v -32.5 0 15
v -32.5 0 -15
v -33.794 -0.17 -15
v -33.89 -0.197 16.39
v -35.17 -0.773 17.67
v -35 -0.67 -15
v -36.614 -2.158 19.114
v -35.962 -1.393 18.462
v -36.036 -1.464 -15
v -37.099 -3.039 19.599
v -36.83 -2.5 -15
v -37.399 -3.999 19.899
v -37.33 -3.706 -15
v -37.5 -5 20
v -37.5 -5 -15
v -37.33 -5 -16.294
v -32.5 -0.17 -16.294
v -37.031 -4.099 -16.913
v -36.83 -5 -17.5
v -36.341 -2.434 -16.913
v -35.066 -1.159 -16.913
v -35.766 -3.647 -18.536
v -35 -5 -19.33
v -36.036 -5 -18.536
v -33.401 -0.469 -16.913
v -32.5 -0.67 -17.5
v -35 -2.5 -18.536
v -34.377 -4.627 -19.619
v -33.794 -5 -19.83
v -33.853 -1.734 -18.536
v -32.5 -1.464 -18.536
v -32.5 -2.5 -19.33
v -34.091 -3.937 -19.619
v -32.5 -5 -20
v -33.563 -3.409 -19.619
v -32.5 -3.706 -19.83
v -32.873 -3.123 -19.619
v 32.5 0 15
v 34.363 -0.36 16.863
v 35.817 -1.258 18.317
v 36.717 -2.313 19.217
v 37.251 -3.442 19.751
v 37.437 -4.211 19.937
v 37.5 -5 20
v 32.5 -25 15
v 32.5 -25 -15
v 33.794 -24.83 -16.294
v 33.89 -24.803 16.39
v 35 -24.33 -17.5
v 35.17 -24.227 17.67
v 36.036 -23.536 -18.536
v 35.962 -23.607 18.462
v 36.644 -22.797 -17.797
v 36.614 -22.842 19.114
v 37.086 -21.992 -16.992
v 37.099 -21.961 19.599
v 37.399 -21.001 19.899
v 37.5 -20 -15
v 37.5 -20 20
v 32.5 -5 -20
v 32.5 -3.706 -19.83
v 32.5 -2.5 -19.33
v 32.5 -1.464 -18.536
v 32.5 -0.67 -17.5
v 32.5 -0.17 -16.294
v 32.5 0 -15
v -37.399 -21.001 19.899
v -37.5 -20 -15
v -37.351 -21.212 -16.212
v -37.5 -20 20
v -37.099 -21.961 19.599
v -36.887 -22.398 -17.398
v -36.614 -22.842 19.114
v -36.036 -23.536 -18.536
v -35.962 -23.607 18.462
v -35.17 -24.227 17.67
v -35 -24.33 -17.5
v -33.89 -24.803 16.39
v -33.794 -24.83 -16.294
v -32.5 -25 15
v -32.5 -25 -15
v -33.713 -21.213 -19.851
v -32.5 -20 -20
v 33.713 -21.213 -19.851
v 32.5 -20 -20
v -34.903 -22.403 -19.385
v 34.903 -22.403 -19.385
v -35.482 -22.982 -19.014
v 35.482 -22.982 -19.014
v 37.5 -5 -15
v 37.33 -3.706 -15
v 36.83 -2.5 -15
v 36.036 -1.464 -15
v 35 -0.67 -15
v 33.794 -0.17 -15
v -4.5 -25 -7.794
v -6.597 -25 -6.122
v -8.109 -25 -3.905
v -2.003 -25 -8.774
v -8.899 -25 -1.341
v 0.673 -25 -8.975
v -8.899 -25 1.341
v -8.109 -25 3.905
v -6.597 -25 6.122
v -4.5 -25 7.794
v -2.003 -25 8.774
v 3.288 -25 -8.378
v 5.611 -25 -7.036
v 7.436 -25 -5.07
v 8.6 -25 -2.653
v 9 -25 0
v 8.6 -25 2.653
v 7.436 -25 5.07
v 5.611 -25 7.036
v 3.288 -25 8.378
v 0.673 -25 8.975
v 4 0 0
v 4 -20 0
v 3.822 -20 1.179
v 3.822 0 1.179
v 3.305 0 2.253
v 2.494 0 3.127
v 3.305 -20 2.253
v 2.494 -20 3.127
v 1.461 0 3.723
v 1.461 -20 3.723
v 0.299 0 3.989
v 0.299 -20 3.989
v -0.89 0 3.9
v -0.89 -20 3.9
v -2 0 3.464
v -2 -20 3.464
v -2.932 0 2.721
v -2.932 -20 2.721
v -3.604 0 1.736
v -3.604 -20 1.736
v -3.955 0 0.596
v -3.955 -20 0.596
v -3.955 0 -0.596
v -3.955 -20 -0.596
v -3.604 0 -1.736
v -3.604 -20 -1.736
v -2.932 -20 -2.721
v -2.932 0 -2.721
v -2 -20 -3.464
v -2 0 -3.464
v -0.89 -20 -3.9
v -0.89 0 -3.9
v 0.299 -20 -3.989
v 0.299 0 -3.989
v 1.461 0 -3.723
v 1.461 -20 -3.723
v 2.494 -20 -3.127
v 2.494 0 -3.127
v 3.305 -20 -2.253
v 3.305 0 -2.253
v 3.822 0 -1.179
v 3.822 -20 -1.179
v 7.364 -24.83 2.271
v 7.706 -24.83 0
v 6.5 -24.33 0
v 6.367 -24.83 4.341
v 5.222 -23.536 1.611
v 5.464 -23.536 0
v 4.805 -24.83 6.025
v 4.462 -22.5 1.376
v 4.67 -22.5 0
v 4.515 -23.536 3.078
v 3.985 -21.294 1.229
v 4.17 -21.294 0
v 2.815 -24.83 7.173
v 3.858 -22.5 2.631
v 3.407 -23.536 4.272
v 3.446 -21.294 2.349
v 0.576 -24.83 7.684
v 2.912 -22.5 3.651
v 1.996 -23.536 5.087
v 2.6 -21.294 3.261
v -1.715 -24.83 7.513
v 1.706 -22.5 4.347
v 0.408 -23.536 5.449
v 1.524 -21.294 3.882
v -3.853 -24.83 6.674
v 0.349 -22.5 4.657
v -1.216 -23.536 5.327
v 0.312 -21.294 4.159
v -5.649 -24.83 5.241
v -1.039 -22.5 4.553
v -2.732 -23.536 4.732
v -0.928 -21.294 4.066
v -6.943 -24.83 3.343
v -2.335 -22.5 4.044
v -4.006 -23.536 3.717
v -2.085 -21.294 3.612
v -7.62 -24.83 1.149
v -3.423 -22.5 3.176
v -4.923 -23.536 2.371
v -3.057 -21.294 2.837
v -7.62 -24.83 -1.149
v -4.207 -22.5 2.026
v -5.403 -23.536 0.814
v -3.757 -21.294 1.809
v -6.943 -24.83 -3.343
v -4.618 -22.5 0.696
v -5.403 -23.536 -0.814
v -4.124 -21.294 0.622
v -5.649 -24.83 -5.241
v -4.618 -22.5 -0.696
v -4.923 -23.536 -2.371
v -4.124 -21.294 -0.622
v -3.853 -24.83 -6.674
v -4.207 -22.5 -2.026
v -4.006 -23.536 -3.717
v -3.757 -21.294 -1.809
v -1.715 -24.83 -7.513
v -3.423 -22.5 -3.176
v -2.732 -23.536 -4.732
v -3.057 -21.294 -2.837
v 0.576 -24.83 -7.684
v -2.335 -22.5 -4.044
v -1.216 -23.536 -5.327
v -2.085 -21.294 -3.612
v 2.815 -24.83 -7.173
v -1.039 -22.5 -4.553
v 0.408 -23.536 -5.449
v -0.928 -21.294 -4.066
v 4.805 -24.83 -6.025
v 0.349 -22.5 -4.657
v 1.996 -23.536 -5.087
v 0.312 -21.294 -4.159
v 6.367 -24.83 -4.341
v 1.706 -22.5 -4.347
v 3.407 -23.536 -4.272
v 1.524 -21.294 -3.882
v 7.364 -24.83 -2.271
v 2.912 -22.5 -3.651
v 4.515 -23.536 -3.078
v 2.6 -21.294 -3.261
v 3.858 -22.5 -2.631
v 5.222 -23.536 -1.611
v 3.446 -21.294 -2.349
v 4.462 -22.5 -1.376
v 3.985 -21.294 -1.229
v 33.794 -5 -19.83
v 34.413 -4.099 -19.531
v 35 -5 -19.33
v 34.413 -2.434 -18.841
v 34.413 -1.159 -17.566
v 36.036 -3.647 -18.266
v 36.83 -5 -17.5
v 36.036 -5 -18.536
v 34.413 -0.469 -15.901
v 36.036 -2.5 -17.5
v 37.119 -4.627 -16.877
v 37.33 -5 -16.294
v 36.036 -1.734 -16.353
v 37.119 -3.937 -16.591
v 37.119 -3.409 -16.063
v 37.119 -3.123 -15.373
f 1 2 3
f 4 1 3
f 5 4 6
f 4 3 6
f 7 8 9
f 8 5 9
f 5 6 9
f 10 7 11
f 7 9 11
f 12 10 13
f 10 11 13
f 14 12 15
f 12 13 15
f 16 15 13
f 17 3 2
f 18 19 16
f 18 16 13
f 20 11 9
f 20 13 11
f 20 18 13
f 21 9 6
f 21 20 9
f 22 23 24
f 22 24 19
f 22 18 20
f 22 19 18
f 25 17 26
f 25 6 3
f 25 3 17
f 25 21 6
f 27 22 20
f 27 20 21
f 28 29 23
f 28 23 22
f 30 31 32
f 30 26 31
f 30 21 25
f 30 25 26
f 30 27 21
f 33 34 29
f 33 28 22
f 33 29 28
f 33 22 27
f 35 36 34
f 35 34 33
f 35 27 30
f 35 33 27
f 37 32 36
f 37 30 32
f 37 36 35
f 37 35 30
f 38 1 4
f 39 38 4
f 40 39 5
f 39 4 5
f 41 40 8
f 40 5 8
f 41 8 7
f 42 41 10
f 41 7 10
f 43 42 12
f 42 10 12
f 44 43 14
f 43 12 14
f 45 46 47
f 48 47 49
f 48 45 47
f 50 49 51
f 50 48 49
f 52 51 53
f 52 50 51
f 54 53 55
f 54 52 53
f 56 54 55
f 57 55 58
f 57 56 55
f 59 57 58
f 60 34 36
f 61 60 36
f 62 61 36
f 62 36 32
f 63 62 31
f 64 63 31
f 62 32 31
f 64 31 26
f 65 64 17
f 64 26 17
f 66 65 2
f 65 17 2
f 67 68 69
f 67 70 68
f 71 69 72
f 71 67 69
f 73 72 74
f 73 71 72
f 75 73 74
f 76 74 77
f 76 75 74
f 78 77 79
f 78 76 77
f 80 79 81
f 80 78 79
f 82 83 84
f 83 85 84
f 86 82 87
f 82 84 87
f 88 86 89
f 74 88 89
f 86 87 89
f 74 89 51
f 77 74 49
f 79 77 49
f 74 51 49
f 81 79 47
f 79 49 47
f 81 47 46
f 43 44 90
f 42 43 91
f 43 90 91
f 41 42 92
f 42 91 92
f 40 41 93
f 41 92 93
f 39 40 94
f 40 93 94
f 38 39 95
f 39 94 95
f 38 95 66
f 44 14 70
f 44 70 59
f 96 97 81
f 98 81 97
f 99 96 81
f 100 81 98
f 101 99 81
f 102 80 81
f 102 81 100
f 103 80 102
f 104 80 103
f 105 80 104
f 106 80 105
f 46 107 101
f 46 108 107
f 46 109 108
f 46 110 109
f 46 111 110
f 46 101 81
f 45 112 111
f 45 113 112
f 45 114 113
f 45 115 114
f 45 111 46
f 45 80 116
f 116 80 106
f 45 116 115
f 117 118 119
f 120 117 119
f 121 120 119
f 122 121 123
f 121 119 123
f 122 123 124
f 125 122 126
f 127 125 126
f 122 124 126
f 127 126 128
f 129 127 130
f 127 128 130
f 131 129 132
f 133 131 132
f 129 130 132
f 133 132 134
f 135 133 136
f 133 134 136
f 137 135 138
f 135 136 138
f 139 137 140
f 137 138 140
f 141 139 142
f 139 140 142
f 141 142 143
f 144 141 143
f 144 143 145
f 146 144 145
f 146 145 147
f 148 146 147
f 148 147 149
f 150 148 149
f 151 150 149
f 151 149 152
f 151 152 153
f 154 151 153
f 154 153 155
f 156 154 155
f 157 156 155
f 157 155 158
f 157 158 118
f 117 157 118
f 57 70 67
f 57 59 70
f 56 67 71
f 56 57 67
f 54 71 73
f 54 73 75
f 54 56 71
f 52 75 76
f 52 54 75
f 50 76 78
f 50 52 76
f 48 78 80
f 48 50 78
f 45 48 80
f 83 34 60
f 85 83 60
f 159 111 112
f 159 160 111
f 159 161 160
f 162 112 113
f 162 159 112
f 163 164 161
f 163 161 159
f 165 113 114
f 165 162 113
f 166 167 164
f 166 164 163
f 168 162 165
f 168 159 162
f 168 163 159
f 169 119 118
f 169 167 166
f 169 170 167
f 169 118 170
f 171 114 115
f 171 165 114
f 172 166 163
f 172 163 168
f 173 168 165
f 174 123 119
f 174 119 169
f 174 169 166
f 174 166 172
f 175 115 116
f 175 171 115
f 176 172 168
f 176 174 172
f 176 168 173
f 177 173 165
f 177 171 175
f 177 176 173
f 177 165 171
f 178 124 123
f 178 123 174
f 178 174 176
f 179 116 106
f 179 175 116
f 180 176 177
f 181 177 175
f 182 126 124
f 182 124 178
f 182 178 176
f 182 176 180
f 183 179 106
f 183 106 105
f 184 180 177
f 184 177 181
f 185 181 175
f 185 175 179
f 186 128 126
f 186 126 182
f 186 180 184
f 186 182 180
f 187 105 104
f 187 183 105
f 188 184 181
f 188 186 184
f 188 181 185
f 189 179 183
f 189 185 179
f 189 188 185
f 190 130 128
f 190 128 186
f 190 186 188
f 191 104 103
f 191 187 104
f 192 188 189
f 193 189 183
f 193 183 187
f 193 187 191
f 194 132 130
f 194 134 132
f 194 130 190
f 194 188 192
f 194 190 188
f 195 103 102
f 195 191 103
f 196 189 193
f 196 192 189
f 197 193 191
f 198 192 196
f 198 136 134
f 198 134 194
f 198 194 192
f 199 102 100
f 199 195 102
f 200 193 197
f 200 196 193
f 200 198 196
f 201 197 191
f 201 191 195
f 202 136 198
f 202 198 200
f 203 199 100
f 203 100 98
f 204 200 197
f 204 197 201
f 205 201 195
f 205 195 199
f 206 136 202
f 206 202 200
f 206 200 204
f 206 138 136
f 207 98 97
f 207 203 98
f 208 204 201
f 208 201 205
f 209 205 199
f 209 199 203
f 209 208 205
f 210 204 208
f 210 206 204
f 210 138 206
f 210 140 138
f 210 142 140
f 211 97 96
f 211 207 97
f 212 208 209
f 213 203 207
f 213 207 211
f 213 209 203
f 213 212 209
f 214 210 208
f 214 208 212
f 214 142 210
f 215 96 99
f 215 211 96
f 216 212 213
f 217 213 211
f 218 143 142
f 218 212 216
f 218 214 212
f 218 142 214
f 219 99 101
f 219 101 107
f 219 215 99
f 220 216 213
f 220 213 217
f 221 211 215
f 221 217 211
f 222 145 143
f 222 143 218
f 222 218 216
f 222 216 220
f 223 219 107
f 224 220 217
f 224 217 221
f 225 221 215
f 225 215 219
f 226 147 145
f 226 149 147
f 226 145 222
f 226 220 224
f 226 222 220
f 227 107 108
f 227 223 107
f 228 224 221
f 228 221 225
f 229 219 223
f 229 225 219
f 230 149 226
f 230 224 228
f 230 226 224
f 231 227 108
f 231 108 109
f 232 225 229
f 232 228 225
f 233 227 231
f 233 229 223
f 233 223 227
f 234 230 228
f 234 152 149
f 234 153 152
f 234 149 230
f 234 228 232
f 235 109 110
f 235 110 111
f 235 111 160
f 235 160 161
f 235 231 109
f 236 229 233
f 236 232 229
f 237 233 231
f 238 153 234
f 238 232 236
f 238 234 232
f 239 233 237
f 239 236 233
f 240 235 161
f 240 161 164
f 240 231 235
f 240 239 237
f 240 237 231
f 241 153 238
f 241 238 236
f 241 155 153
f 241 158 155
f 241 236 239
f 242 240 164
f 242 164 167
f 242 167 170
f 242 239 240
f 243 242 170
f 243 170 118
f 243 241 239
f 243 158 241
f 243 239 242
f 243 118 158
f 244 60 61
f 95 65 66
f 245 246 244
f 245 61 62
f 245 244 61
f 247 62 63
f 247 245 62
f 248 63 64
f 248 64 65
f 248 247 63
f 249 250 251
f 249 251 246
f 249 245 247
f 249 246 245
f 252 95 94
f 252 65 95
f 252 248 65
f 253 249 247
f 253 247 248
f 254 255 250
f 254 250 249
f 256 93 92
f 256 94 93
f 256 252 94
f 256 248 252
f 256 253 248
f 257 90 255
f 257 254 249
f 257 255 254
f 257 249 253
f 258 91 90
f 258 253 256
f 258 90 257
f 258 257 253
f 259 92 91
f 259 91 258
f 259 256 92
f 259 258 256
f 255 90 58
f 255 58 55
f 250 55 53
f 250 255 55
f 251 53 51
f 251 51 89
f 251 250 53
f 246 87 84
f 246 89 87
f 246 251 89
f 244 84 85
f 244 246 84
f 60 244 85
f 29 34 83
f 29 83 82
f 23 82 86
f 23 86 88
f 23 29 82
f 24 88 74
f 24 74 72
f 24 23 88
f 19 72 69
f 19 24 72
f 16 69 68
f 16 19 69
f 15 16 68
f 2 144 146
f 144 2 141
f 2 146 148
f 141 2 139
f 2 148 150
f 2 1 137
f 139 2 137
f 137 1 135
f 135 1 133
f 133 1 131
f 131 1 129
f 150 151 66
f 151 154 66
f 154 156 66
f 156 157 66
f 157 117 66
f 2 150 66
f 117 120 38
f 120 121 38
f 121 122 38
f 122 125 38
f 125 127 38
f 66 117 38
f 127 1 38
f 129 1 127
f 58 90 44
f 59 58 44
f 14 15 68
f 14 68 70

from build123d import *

# Parameters (mm, degrees)
F0_W         = 75
F0_H         = 40
F1_DEPTH     = 25
F2_R         = 4
F3_DEPTH     = 25
F4_R         = 5
F5_T1_DEPTH  = 27.5
F5_T3_DEPTH  = 65
F5_T5_DEPTH  = 47.5
F5_T7_DEPTH  = 100
F5_S11_W     = 5.1
F5_S11_H     = 5.1
F5_T12_DEPTH = 5.1
F5_S17_W     = 5.1
F5_S17_H     = 5.1
F5_T18_DEPTH = 5.1


# Not quite as in the source:
# - a fillet or chamfer that OpenCascade refuses, or shapes differently, is made with other operations: its cross-section is extruded or revolved along the edge and cut away or added


with BuildPart() as f1:
    # F0 (on Front) → F1 (new body)
    with BuildSketch(Plane.XZ):
        Rectangle(F0_W, F0_H)
    extrude(amount=F1_DEPTH)

    # F2 (on face) → F3 (cut)
    with BuildSketch(Plane.XZ.offset(25)):
        Circle(F2_R)
    extrude(amount=-F3_DEPTH, mode=Mode.SUBTRACT)

    # F4
    f4_edges = [f1.edges().sort_by_distance(p)[0] for p in [
        (0, -25, 20),
        (-37.5, -25, 0),
        (0, -25, -20),
        (37.5, -25, 0),
    ]]
    fillet(f4_edges, radius=F4_R)

    # F5: fillet of radius 5 on 8 edges, made by hand

    # F5_s2 → F5_t1 (cut)
    with BuildSketch(Plane.XZ.offset(5)):
        with BuildLine():
            ThreePointArc((-32.5, -20), (-36.0355339059, -18.5355339059), (-37.5, -15))
            Line((-37.5, -15), (-37.5, -20))
            Line((-37.5, -20), (-32.5, -20))
        make_face()
        with BuildLine():
            ThreePointArc((37.5, -15), (36.0355339059, -18.5355339059), (32.5, -20))
            Line((32.5, -20), (37.5, -20))
            Line((37.5, -20), (37.5, -15))
        make_face()
    extrude(amount=F5_T1_DEPTH, mode=Mode.SUBTRACT)

    # F5_s4 → F5_t3 (cut)
    with BuildSketch(Plane.YZ.offset(-32.5)):
        with BuildLine():
            ThreePointArc((-5, -20), (-1.4644660941, -18.5355339059), (0, -15))
            Line((0, -15), (0, -20))
            Line((0, -20), (-5, -20))
        make_face()
    extrude(amount=F5_T3_DEPTH, mode=Mode.SUBTRACT)

    # F5_s6 → F5_t5 (cut)
    with BuildSketch(Plane.XY.offset(-15)):
        with BuildLine():
            ThreePointArc((37.5, -5), (36.0355339059, -1.4644660941), (32.5, 0))
            Line((32.5, 0), (37.5, 0))
            Line((37.5, 0), (37.5, -5))
        make_face()
        with BuildLine():
            ThreePointArc((-32.5, 0), (-36.0355339059, -1.4644660941), (-37.5, -5))
            Line((-37.5, -5), (-37.5, 0))
            Line((-37.5, 0), (-32.5, 0))
        make_face()
    extrude(amount=F5_T5_DEPTH, mode=Mode.SUBTRACT)

    # F5_s8 → F5_t7 (cut)
    with BuildSketch(Plane.YZ.offset(-50)):
        with BuildLine():
            ThreePointArc((0, 15), (-1.4644660941, 18.5355339059), (-5, 20))
            Line((-5, 20), (0, 20))
            Line((0, 20), (0, 15))
        make_face()
    extrude(amount=F5_T7_DEPTH, mode=Mode.SUBTRACT)


with BuildPart() as f5_tool10:
    # F5_s11 → F5_t12 (new body)
    with BuildSketch(Plane.XY.offset(-15)):
        with Locations((-35.05, -2.45)):
            Rectangle(F5_S11_W, F5_S11_H)
    extrude(amount=-F5_T12_DEPTH)

    # F5_s13 → F5_t14 (revolve, cut)
    with BuildSketch(Plane(origin=(-32.5, -5, -15), x_dir=(0.7071067812, -0.7071067812, 0), z_dir=(0.7071067812, 0.7071067812, 0))):
        with BuildLine():
            ThreePointArc((0, -5), (5, 0), (0, 5))
            Line((0, 5), (0, -5))
        make_face()
    revolve(axis=Axis((-32.5, -5, -15), (0, 0, -1)), mode=Mode.SUBTRACT)


with BuildPart() as f1_1:
    add(f1.part)

    # F5_t9: cut F5_tool10
    add(f5_tool10.part, mode=Mode.SUBTRACT)


with BuildPart() as f5_tool16:
    # F5_s17 → F5_t18 (new body)
    with BuildSketch(Plane.YZ.offset(32.5)):
        with Locations((-2.45, -17.55)):
            Rectangle(F5_S17_W, F5_S17_H)
    extrude(amount=F5_T18_DEPTH)

    # F5_s19 → F5_t20 (revolve, cut)
    with BuildSketch(Plane(origin=(32.5, -5, -15), x_dir=(0, -0.7071067812, 0.7071067812), z_dir=(0, 0.7071067812, 0.7071067812))):
        with BuildLine():
            ThreePointArc((0, -5), (5, 0), (0, 5))
            Line((0, 5), (0, -5))
        make_face()
    revolve(axis=Axis((32.5, -5, -15), (1, 0, 0)), mode=Mode.SUBTRACT)


with BuildPart() as f1_2:
    add(f1_1.part)

    # F5_t15: cut F5_tool16
    add(f5_tool16.part, mode=Mode.SUBTRACT)

    # F5_s21 → F5_t22 (revolve, cut)
    with BuildSketch(Plane.XY):
        with BuildLine():
            ThreePointArc((9, -25), (5.4644660941, -23.5355339059), (4, -20))
            Line((4, -20), (4, -25))
            Line((4, -25), (9, -25))
        make_face()
    revolve(axis=Axis((0, -25, 0), (0, -1, 0)), mode=Mode.SUBTRACT)


solid = f1_2.part
